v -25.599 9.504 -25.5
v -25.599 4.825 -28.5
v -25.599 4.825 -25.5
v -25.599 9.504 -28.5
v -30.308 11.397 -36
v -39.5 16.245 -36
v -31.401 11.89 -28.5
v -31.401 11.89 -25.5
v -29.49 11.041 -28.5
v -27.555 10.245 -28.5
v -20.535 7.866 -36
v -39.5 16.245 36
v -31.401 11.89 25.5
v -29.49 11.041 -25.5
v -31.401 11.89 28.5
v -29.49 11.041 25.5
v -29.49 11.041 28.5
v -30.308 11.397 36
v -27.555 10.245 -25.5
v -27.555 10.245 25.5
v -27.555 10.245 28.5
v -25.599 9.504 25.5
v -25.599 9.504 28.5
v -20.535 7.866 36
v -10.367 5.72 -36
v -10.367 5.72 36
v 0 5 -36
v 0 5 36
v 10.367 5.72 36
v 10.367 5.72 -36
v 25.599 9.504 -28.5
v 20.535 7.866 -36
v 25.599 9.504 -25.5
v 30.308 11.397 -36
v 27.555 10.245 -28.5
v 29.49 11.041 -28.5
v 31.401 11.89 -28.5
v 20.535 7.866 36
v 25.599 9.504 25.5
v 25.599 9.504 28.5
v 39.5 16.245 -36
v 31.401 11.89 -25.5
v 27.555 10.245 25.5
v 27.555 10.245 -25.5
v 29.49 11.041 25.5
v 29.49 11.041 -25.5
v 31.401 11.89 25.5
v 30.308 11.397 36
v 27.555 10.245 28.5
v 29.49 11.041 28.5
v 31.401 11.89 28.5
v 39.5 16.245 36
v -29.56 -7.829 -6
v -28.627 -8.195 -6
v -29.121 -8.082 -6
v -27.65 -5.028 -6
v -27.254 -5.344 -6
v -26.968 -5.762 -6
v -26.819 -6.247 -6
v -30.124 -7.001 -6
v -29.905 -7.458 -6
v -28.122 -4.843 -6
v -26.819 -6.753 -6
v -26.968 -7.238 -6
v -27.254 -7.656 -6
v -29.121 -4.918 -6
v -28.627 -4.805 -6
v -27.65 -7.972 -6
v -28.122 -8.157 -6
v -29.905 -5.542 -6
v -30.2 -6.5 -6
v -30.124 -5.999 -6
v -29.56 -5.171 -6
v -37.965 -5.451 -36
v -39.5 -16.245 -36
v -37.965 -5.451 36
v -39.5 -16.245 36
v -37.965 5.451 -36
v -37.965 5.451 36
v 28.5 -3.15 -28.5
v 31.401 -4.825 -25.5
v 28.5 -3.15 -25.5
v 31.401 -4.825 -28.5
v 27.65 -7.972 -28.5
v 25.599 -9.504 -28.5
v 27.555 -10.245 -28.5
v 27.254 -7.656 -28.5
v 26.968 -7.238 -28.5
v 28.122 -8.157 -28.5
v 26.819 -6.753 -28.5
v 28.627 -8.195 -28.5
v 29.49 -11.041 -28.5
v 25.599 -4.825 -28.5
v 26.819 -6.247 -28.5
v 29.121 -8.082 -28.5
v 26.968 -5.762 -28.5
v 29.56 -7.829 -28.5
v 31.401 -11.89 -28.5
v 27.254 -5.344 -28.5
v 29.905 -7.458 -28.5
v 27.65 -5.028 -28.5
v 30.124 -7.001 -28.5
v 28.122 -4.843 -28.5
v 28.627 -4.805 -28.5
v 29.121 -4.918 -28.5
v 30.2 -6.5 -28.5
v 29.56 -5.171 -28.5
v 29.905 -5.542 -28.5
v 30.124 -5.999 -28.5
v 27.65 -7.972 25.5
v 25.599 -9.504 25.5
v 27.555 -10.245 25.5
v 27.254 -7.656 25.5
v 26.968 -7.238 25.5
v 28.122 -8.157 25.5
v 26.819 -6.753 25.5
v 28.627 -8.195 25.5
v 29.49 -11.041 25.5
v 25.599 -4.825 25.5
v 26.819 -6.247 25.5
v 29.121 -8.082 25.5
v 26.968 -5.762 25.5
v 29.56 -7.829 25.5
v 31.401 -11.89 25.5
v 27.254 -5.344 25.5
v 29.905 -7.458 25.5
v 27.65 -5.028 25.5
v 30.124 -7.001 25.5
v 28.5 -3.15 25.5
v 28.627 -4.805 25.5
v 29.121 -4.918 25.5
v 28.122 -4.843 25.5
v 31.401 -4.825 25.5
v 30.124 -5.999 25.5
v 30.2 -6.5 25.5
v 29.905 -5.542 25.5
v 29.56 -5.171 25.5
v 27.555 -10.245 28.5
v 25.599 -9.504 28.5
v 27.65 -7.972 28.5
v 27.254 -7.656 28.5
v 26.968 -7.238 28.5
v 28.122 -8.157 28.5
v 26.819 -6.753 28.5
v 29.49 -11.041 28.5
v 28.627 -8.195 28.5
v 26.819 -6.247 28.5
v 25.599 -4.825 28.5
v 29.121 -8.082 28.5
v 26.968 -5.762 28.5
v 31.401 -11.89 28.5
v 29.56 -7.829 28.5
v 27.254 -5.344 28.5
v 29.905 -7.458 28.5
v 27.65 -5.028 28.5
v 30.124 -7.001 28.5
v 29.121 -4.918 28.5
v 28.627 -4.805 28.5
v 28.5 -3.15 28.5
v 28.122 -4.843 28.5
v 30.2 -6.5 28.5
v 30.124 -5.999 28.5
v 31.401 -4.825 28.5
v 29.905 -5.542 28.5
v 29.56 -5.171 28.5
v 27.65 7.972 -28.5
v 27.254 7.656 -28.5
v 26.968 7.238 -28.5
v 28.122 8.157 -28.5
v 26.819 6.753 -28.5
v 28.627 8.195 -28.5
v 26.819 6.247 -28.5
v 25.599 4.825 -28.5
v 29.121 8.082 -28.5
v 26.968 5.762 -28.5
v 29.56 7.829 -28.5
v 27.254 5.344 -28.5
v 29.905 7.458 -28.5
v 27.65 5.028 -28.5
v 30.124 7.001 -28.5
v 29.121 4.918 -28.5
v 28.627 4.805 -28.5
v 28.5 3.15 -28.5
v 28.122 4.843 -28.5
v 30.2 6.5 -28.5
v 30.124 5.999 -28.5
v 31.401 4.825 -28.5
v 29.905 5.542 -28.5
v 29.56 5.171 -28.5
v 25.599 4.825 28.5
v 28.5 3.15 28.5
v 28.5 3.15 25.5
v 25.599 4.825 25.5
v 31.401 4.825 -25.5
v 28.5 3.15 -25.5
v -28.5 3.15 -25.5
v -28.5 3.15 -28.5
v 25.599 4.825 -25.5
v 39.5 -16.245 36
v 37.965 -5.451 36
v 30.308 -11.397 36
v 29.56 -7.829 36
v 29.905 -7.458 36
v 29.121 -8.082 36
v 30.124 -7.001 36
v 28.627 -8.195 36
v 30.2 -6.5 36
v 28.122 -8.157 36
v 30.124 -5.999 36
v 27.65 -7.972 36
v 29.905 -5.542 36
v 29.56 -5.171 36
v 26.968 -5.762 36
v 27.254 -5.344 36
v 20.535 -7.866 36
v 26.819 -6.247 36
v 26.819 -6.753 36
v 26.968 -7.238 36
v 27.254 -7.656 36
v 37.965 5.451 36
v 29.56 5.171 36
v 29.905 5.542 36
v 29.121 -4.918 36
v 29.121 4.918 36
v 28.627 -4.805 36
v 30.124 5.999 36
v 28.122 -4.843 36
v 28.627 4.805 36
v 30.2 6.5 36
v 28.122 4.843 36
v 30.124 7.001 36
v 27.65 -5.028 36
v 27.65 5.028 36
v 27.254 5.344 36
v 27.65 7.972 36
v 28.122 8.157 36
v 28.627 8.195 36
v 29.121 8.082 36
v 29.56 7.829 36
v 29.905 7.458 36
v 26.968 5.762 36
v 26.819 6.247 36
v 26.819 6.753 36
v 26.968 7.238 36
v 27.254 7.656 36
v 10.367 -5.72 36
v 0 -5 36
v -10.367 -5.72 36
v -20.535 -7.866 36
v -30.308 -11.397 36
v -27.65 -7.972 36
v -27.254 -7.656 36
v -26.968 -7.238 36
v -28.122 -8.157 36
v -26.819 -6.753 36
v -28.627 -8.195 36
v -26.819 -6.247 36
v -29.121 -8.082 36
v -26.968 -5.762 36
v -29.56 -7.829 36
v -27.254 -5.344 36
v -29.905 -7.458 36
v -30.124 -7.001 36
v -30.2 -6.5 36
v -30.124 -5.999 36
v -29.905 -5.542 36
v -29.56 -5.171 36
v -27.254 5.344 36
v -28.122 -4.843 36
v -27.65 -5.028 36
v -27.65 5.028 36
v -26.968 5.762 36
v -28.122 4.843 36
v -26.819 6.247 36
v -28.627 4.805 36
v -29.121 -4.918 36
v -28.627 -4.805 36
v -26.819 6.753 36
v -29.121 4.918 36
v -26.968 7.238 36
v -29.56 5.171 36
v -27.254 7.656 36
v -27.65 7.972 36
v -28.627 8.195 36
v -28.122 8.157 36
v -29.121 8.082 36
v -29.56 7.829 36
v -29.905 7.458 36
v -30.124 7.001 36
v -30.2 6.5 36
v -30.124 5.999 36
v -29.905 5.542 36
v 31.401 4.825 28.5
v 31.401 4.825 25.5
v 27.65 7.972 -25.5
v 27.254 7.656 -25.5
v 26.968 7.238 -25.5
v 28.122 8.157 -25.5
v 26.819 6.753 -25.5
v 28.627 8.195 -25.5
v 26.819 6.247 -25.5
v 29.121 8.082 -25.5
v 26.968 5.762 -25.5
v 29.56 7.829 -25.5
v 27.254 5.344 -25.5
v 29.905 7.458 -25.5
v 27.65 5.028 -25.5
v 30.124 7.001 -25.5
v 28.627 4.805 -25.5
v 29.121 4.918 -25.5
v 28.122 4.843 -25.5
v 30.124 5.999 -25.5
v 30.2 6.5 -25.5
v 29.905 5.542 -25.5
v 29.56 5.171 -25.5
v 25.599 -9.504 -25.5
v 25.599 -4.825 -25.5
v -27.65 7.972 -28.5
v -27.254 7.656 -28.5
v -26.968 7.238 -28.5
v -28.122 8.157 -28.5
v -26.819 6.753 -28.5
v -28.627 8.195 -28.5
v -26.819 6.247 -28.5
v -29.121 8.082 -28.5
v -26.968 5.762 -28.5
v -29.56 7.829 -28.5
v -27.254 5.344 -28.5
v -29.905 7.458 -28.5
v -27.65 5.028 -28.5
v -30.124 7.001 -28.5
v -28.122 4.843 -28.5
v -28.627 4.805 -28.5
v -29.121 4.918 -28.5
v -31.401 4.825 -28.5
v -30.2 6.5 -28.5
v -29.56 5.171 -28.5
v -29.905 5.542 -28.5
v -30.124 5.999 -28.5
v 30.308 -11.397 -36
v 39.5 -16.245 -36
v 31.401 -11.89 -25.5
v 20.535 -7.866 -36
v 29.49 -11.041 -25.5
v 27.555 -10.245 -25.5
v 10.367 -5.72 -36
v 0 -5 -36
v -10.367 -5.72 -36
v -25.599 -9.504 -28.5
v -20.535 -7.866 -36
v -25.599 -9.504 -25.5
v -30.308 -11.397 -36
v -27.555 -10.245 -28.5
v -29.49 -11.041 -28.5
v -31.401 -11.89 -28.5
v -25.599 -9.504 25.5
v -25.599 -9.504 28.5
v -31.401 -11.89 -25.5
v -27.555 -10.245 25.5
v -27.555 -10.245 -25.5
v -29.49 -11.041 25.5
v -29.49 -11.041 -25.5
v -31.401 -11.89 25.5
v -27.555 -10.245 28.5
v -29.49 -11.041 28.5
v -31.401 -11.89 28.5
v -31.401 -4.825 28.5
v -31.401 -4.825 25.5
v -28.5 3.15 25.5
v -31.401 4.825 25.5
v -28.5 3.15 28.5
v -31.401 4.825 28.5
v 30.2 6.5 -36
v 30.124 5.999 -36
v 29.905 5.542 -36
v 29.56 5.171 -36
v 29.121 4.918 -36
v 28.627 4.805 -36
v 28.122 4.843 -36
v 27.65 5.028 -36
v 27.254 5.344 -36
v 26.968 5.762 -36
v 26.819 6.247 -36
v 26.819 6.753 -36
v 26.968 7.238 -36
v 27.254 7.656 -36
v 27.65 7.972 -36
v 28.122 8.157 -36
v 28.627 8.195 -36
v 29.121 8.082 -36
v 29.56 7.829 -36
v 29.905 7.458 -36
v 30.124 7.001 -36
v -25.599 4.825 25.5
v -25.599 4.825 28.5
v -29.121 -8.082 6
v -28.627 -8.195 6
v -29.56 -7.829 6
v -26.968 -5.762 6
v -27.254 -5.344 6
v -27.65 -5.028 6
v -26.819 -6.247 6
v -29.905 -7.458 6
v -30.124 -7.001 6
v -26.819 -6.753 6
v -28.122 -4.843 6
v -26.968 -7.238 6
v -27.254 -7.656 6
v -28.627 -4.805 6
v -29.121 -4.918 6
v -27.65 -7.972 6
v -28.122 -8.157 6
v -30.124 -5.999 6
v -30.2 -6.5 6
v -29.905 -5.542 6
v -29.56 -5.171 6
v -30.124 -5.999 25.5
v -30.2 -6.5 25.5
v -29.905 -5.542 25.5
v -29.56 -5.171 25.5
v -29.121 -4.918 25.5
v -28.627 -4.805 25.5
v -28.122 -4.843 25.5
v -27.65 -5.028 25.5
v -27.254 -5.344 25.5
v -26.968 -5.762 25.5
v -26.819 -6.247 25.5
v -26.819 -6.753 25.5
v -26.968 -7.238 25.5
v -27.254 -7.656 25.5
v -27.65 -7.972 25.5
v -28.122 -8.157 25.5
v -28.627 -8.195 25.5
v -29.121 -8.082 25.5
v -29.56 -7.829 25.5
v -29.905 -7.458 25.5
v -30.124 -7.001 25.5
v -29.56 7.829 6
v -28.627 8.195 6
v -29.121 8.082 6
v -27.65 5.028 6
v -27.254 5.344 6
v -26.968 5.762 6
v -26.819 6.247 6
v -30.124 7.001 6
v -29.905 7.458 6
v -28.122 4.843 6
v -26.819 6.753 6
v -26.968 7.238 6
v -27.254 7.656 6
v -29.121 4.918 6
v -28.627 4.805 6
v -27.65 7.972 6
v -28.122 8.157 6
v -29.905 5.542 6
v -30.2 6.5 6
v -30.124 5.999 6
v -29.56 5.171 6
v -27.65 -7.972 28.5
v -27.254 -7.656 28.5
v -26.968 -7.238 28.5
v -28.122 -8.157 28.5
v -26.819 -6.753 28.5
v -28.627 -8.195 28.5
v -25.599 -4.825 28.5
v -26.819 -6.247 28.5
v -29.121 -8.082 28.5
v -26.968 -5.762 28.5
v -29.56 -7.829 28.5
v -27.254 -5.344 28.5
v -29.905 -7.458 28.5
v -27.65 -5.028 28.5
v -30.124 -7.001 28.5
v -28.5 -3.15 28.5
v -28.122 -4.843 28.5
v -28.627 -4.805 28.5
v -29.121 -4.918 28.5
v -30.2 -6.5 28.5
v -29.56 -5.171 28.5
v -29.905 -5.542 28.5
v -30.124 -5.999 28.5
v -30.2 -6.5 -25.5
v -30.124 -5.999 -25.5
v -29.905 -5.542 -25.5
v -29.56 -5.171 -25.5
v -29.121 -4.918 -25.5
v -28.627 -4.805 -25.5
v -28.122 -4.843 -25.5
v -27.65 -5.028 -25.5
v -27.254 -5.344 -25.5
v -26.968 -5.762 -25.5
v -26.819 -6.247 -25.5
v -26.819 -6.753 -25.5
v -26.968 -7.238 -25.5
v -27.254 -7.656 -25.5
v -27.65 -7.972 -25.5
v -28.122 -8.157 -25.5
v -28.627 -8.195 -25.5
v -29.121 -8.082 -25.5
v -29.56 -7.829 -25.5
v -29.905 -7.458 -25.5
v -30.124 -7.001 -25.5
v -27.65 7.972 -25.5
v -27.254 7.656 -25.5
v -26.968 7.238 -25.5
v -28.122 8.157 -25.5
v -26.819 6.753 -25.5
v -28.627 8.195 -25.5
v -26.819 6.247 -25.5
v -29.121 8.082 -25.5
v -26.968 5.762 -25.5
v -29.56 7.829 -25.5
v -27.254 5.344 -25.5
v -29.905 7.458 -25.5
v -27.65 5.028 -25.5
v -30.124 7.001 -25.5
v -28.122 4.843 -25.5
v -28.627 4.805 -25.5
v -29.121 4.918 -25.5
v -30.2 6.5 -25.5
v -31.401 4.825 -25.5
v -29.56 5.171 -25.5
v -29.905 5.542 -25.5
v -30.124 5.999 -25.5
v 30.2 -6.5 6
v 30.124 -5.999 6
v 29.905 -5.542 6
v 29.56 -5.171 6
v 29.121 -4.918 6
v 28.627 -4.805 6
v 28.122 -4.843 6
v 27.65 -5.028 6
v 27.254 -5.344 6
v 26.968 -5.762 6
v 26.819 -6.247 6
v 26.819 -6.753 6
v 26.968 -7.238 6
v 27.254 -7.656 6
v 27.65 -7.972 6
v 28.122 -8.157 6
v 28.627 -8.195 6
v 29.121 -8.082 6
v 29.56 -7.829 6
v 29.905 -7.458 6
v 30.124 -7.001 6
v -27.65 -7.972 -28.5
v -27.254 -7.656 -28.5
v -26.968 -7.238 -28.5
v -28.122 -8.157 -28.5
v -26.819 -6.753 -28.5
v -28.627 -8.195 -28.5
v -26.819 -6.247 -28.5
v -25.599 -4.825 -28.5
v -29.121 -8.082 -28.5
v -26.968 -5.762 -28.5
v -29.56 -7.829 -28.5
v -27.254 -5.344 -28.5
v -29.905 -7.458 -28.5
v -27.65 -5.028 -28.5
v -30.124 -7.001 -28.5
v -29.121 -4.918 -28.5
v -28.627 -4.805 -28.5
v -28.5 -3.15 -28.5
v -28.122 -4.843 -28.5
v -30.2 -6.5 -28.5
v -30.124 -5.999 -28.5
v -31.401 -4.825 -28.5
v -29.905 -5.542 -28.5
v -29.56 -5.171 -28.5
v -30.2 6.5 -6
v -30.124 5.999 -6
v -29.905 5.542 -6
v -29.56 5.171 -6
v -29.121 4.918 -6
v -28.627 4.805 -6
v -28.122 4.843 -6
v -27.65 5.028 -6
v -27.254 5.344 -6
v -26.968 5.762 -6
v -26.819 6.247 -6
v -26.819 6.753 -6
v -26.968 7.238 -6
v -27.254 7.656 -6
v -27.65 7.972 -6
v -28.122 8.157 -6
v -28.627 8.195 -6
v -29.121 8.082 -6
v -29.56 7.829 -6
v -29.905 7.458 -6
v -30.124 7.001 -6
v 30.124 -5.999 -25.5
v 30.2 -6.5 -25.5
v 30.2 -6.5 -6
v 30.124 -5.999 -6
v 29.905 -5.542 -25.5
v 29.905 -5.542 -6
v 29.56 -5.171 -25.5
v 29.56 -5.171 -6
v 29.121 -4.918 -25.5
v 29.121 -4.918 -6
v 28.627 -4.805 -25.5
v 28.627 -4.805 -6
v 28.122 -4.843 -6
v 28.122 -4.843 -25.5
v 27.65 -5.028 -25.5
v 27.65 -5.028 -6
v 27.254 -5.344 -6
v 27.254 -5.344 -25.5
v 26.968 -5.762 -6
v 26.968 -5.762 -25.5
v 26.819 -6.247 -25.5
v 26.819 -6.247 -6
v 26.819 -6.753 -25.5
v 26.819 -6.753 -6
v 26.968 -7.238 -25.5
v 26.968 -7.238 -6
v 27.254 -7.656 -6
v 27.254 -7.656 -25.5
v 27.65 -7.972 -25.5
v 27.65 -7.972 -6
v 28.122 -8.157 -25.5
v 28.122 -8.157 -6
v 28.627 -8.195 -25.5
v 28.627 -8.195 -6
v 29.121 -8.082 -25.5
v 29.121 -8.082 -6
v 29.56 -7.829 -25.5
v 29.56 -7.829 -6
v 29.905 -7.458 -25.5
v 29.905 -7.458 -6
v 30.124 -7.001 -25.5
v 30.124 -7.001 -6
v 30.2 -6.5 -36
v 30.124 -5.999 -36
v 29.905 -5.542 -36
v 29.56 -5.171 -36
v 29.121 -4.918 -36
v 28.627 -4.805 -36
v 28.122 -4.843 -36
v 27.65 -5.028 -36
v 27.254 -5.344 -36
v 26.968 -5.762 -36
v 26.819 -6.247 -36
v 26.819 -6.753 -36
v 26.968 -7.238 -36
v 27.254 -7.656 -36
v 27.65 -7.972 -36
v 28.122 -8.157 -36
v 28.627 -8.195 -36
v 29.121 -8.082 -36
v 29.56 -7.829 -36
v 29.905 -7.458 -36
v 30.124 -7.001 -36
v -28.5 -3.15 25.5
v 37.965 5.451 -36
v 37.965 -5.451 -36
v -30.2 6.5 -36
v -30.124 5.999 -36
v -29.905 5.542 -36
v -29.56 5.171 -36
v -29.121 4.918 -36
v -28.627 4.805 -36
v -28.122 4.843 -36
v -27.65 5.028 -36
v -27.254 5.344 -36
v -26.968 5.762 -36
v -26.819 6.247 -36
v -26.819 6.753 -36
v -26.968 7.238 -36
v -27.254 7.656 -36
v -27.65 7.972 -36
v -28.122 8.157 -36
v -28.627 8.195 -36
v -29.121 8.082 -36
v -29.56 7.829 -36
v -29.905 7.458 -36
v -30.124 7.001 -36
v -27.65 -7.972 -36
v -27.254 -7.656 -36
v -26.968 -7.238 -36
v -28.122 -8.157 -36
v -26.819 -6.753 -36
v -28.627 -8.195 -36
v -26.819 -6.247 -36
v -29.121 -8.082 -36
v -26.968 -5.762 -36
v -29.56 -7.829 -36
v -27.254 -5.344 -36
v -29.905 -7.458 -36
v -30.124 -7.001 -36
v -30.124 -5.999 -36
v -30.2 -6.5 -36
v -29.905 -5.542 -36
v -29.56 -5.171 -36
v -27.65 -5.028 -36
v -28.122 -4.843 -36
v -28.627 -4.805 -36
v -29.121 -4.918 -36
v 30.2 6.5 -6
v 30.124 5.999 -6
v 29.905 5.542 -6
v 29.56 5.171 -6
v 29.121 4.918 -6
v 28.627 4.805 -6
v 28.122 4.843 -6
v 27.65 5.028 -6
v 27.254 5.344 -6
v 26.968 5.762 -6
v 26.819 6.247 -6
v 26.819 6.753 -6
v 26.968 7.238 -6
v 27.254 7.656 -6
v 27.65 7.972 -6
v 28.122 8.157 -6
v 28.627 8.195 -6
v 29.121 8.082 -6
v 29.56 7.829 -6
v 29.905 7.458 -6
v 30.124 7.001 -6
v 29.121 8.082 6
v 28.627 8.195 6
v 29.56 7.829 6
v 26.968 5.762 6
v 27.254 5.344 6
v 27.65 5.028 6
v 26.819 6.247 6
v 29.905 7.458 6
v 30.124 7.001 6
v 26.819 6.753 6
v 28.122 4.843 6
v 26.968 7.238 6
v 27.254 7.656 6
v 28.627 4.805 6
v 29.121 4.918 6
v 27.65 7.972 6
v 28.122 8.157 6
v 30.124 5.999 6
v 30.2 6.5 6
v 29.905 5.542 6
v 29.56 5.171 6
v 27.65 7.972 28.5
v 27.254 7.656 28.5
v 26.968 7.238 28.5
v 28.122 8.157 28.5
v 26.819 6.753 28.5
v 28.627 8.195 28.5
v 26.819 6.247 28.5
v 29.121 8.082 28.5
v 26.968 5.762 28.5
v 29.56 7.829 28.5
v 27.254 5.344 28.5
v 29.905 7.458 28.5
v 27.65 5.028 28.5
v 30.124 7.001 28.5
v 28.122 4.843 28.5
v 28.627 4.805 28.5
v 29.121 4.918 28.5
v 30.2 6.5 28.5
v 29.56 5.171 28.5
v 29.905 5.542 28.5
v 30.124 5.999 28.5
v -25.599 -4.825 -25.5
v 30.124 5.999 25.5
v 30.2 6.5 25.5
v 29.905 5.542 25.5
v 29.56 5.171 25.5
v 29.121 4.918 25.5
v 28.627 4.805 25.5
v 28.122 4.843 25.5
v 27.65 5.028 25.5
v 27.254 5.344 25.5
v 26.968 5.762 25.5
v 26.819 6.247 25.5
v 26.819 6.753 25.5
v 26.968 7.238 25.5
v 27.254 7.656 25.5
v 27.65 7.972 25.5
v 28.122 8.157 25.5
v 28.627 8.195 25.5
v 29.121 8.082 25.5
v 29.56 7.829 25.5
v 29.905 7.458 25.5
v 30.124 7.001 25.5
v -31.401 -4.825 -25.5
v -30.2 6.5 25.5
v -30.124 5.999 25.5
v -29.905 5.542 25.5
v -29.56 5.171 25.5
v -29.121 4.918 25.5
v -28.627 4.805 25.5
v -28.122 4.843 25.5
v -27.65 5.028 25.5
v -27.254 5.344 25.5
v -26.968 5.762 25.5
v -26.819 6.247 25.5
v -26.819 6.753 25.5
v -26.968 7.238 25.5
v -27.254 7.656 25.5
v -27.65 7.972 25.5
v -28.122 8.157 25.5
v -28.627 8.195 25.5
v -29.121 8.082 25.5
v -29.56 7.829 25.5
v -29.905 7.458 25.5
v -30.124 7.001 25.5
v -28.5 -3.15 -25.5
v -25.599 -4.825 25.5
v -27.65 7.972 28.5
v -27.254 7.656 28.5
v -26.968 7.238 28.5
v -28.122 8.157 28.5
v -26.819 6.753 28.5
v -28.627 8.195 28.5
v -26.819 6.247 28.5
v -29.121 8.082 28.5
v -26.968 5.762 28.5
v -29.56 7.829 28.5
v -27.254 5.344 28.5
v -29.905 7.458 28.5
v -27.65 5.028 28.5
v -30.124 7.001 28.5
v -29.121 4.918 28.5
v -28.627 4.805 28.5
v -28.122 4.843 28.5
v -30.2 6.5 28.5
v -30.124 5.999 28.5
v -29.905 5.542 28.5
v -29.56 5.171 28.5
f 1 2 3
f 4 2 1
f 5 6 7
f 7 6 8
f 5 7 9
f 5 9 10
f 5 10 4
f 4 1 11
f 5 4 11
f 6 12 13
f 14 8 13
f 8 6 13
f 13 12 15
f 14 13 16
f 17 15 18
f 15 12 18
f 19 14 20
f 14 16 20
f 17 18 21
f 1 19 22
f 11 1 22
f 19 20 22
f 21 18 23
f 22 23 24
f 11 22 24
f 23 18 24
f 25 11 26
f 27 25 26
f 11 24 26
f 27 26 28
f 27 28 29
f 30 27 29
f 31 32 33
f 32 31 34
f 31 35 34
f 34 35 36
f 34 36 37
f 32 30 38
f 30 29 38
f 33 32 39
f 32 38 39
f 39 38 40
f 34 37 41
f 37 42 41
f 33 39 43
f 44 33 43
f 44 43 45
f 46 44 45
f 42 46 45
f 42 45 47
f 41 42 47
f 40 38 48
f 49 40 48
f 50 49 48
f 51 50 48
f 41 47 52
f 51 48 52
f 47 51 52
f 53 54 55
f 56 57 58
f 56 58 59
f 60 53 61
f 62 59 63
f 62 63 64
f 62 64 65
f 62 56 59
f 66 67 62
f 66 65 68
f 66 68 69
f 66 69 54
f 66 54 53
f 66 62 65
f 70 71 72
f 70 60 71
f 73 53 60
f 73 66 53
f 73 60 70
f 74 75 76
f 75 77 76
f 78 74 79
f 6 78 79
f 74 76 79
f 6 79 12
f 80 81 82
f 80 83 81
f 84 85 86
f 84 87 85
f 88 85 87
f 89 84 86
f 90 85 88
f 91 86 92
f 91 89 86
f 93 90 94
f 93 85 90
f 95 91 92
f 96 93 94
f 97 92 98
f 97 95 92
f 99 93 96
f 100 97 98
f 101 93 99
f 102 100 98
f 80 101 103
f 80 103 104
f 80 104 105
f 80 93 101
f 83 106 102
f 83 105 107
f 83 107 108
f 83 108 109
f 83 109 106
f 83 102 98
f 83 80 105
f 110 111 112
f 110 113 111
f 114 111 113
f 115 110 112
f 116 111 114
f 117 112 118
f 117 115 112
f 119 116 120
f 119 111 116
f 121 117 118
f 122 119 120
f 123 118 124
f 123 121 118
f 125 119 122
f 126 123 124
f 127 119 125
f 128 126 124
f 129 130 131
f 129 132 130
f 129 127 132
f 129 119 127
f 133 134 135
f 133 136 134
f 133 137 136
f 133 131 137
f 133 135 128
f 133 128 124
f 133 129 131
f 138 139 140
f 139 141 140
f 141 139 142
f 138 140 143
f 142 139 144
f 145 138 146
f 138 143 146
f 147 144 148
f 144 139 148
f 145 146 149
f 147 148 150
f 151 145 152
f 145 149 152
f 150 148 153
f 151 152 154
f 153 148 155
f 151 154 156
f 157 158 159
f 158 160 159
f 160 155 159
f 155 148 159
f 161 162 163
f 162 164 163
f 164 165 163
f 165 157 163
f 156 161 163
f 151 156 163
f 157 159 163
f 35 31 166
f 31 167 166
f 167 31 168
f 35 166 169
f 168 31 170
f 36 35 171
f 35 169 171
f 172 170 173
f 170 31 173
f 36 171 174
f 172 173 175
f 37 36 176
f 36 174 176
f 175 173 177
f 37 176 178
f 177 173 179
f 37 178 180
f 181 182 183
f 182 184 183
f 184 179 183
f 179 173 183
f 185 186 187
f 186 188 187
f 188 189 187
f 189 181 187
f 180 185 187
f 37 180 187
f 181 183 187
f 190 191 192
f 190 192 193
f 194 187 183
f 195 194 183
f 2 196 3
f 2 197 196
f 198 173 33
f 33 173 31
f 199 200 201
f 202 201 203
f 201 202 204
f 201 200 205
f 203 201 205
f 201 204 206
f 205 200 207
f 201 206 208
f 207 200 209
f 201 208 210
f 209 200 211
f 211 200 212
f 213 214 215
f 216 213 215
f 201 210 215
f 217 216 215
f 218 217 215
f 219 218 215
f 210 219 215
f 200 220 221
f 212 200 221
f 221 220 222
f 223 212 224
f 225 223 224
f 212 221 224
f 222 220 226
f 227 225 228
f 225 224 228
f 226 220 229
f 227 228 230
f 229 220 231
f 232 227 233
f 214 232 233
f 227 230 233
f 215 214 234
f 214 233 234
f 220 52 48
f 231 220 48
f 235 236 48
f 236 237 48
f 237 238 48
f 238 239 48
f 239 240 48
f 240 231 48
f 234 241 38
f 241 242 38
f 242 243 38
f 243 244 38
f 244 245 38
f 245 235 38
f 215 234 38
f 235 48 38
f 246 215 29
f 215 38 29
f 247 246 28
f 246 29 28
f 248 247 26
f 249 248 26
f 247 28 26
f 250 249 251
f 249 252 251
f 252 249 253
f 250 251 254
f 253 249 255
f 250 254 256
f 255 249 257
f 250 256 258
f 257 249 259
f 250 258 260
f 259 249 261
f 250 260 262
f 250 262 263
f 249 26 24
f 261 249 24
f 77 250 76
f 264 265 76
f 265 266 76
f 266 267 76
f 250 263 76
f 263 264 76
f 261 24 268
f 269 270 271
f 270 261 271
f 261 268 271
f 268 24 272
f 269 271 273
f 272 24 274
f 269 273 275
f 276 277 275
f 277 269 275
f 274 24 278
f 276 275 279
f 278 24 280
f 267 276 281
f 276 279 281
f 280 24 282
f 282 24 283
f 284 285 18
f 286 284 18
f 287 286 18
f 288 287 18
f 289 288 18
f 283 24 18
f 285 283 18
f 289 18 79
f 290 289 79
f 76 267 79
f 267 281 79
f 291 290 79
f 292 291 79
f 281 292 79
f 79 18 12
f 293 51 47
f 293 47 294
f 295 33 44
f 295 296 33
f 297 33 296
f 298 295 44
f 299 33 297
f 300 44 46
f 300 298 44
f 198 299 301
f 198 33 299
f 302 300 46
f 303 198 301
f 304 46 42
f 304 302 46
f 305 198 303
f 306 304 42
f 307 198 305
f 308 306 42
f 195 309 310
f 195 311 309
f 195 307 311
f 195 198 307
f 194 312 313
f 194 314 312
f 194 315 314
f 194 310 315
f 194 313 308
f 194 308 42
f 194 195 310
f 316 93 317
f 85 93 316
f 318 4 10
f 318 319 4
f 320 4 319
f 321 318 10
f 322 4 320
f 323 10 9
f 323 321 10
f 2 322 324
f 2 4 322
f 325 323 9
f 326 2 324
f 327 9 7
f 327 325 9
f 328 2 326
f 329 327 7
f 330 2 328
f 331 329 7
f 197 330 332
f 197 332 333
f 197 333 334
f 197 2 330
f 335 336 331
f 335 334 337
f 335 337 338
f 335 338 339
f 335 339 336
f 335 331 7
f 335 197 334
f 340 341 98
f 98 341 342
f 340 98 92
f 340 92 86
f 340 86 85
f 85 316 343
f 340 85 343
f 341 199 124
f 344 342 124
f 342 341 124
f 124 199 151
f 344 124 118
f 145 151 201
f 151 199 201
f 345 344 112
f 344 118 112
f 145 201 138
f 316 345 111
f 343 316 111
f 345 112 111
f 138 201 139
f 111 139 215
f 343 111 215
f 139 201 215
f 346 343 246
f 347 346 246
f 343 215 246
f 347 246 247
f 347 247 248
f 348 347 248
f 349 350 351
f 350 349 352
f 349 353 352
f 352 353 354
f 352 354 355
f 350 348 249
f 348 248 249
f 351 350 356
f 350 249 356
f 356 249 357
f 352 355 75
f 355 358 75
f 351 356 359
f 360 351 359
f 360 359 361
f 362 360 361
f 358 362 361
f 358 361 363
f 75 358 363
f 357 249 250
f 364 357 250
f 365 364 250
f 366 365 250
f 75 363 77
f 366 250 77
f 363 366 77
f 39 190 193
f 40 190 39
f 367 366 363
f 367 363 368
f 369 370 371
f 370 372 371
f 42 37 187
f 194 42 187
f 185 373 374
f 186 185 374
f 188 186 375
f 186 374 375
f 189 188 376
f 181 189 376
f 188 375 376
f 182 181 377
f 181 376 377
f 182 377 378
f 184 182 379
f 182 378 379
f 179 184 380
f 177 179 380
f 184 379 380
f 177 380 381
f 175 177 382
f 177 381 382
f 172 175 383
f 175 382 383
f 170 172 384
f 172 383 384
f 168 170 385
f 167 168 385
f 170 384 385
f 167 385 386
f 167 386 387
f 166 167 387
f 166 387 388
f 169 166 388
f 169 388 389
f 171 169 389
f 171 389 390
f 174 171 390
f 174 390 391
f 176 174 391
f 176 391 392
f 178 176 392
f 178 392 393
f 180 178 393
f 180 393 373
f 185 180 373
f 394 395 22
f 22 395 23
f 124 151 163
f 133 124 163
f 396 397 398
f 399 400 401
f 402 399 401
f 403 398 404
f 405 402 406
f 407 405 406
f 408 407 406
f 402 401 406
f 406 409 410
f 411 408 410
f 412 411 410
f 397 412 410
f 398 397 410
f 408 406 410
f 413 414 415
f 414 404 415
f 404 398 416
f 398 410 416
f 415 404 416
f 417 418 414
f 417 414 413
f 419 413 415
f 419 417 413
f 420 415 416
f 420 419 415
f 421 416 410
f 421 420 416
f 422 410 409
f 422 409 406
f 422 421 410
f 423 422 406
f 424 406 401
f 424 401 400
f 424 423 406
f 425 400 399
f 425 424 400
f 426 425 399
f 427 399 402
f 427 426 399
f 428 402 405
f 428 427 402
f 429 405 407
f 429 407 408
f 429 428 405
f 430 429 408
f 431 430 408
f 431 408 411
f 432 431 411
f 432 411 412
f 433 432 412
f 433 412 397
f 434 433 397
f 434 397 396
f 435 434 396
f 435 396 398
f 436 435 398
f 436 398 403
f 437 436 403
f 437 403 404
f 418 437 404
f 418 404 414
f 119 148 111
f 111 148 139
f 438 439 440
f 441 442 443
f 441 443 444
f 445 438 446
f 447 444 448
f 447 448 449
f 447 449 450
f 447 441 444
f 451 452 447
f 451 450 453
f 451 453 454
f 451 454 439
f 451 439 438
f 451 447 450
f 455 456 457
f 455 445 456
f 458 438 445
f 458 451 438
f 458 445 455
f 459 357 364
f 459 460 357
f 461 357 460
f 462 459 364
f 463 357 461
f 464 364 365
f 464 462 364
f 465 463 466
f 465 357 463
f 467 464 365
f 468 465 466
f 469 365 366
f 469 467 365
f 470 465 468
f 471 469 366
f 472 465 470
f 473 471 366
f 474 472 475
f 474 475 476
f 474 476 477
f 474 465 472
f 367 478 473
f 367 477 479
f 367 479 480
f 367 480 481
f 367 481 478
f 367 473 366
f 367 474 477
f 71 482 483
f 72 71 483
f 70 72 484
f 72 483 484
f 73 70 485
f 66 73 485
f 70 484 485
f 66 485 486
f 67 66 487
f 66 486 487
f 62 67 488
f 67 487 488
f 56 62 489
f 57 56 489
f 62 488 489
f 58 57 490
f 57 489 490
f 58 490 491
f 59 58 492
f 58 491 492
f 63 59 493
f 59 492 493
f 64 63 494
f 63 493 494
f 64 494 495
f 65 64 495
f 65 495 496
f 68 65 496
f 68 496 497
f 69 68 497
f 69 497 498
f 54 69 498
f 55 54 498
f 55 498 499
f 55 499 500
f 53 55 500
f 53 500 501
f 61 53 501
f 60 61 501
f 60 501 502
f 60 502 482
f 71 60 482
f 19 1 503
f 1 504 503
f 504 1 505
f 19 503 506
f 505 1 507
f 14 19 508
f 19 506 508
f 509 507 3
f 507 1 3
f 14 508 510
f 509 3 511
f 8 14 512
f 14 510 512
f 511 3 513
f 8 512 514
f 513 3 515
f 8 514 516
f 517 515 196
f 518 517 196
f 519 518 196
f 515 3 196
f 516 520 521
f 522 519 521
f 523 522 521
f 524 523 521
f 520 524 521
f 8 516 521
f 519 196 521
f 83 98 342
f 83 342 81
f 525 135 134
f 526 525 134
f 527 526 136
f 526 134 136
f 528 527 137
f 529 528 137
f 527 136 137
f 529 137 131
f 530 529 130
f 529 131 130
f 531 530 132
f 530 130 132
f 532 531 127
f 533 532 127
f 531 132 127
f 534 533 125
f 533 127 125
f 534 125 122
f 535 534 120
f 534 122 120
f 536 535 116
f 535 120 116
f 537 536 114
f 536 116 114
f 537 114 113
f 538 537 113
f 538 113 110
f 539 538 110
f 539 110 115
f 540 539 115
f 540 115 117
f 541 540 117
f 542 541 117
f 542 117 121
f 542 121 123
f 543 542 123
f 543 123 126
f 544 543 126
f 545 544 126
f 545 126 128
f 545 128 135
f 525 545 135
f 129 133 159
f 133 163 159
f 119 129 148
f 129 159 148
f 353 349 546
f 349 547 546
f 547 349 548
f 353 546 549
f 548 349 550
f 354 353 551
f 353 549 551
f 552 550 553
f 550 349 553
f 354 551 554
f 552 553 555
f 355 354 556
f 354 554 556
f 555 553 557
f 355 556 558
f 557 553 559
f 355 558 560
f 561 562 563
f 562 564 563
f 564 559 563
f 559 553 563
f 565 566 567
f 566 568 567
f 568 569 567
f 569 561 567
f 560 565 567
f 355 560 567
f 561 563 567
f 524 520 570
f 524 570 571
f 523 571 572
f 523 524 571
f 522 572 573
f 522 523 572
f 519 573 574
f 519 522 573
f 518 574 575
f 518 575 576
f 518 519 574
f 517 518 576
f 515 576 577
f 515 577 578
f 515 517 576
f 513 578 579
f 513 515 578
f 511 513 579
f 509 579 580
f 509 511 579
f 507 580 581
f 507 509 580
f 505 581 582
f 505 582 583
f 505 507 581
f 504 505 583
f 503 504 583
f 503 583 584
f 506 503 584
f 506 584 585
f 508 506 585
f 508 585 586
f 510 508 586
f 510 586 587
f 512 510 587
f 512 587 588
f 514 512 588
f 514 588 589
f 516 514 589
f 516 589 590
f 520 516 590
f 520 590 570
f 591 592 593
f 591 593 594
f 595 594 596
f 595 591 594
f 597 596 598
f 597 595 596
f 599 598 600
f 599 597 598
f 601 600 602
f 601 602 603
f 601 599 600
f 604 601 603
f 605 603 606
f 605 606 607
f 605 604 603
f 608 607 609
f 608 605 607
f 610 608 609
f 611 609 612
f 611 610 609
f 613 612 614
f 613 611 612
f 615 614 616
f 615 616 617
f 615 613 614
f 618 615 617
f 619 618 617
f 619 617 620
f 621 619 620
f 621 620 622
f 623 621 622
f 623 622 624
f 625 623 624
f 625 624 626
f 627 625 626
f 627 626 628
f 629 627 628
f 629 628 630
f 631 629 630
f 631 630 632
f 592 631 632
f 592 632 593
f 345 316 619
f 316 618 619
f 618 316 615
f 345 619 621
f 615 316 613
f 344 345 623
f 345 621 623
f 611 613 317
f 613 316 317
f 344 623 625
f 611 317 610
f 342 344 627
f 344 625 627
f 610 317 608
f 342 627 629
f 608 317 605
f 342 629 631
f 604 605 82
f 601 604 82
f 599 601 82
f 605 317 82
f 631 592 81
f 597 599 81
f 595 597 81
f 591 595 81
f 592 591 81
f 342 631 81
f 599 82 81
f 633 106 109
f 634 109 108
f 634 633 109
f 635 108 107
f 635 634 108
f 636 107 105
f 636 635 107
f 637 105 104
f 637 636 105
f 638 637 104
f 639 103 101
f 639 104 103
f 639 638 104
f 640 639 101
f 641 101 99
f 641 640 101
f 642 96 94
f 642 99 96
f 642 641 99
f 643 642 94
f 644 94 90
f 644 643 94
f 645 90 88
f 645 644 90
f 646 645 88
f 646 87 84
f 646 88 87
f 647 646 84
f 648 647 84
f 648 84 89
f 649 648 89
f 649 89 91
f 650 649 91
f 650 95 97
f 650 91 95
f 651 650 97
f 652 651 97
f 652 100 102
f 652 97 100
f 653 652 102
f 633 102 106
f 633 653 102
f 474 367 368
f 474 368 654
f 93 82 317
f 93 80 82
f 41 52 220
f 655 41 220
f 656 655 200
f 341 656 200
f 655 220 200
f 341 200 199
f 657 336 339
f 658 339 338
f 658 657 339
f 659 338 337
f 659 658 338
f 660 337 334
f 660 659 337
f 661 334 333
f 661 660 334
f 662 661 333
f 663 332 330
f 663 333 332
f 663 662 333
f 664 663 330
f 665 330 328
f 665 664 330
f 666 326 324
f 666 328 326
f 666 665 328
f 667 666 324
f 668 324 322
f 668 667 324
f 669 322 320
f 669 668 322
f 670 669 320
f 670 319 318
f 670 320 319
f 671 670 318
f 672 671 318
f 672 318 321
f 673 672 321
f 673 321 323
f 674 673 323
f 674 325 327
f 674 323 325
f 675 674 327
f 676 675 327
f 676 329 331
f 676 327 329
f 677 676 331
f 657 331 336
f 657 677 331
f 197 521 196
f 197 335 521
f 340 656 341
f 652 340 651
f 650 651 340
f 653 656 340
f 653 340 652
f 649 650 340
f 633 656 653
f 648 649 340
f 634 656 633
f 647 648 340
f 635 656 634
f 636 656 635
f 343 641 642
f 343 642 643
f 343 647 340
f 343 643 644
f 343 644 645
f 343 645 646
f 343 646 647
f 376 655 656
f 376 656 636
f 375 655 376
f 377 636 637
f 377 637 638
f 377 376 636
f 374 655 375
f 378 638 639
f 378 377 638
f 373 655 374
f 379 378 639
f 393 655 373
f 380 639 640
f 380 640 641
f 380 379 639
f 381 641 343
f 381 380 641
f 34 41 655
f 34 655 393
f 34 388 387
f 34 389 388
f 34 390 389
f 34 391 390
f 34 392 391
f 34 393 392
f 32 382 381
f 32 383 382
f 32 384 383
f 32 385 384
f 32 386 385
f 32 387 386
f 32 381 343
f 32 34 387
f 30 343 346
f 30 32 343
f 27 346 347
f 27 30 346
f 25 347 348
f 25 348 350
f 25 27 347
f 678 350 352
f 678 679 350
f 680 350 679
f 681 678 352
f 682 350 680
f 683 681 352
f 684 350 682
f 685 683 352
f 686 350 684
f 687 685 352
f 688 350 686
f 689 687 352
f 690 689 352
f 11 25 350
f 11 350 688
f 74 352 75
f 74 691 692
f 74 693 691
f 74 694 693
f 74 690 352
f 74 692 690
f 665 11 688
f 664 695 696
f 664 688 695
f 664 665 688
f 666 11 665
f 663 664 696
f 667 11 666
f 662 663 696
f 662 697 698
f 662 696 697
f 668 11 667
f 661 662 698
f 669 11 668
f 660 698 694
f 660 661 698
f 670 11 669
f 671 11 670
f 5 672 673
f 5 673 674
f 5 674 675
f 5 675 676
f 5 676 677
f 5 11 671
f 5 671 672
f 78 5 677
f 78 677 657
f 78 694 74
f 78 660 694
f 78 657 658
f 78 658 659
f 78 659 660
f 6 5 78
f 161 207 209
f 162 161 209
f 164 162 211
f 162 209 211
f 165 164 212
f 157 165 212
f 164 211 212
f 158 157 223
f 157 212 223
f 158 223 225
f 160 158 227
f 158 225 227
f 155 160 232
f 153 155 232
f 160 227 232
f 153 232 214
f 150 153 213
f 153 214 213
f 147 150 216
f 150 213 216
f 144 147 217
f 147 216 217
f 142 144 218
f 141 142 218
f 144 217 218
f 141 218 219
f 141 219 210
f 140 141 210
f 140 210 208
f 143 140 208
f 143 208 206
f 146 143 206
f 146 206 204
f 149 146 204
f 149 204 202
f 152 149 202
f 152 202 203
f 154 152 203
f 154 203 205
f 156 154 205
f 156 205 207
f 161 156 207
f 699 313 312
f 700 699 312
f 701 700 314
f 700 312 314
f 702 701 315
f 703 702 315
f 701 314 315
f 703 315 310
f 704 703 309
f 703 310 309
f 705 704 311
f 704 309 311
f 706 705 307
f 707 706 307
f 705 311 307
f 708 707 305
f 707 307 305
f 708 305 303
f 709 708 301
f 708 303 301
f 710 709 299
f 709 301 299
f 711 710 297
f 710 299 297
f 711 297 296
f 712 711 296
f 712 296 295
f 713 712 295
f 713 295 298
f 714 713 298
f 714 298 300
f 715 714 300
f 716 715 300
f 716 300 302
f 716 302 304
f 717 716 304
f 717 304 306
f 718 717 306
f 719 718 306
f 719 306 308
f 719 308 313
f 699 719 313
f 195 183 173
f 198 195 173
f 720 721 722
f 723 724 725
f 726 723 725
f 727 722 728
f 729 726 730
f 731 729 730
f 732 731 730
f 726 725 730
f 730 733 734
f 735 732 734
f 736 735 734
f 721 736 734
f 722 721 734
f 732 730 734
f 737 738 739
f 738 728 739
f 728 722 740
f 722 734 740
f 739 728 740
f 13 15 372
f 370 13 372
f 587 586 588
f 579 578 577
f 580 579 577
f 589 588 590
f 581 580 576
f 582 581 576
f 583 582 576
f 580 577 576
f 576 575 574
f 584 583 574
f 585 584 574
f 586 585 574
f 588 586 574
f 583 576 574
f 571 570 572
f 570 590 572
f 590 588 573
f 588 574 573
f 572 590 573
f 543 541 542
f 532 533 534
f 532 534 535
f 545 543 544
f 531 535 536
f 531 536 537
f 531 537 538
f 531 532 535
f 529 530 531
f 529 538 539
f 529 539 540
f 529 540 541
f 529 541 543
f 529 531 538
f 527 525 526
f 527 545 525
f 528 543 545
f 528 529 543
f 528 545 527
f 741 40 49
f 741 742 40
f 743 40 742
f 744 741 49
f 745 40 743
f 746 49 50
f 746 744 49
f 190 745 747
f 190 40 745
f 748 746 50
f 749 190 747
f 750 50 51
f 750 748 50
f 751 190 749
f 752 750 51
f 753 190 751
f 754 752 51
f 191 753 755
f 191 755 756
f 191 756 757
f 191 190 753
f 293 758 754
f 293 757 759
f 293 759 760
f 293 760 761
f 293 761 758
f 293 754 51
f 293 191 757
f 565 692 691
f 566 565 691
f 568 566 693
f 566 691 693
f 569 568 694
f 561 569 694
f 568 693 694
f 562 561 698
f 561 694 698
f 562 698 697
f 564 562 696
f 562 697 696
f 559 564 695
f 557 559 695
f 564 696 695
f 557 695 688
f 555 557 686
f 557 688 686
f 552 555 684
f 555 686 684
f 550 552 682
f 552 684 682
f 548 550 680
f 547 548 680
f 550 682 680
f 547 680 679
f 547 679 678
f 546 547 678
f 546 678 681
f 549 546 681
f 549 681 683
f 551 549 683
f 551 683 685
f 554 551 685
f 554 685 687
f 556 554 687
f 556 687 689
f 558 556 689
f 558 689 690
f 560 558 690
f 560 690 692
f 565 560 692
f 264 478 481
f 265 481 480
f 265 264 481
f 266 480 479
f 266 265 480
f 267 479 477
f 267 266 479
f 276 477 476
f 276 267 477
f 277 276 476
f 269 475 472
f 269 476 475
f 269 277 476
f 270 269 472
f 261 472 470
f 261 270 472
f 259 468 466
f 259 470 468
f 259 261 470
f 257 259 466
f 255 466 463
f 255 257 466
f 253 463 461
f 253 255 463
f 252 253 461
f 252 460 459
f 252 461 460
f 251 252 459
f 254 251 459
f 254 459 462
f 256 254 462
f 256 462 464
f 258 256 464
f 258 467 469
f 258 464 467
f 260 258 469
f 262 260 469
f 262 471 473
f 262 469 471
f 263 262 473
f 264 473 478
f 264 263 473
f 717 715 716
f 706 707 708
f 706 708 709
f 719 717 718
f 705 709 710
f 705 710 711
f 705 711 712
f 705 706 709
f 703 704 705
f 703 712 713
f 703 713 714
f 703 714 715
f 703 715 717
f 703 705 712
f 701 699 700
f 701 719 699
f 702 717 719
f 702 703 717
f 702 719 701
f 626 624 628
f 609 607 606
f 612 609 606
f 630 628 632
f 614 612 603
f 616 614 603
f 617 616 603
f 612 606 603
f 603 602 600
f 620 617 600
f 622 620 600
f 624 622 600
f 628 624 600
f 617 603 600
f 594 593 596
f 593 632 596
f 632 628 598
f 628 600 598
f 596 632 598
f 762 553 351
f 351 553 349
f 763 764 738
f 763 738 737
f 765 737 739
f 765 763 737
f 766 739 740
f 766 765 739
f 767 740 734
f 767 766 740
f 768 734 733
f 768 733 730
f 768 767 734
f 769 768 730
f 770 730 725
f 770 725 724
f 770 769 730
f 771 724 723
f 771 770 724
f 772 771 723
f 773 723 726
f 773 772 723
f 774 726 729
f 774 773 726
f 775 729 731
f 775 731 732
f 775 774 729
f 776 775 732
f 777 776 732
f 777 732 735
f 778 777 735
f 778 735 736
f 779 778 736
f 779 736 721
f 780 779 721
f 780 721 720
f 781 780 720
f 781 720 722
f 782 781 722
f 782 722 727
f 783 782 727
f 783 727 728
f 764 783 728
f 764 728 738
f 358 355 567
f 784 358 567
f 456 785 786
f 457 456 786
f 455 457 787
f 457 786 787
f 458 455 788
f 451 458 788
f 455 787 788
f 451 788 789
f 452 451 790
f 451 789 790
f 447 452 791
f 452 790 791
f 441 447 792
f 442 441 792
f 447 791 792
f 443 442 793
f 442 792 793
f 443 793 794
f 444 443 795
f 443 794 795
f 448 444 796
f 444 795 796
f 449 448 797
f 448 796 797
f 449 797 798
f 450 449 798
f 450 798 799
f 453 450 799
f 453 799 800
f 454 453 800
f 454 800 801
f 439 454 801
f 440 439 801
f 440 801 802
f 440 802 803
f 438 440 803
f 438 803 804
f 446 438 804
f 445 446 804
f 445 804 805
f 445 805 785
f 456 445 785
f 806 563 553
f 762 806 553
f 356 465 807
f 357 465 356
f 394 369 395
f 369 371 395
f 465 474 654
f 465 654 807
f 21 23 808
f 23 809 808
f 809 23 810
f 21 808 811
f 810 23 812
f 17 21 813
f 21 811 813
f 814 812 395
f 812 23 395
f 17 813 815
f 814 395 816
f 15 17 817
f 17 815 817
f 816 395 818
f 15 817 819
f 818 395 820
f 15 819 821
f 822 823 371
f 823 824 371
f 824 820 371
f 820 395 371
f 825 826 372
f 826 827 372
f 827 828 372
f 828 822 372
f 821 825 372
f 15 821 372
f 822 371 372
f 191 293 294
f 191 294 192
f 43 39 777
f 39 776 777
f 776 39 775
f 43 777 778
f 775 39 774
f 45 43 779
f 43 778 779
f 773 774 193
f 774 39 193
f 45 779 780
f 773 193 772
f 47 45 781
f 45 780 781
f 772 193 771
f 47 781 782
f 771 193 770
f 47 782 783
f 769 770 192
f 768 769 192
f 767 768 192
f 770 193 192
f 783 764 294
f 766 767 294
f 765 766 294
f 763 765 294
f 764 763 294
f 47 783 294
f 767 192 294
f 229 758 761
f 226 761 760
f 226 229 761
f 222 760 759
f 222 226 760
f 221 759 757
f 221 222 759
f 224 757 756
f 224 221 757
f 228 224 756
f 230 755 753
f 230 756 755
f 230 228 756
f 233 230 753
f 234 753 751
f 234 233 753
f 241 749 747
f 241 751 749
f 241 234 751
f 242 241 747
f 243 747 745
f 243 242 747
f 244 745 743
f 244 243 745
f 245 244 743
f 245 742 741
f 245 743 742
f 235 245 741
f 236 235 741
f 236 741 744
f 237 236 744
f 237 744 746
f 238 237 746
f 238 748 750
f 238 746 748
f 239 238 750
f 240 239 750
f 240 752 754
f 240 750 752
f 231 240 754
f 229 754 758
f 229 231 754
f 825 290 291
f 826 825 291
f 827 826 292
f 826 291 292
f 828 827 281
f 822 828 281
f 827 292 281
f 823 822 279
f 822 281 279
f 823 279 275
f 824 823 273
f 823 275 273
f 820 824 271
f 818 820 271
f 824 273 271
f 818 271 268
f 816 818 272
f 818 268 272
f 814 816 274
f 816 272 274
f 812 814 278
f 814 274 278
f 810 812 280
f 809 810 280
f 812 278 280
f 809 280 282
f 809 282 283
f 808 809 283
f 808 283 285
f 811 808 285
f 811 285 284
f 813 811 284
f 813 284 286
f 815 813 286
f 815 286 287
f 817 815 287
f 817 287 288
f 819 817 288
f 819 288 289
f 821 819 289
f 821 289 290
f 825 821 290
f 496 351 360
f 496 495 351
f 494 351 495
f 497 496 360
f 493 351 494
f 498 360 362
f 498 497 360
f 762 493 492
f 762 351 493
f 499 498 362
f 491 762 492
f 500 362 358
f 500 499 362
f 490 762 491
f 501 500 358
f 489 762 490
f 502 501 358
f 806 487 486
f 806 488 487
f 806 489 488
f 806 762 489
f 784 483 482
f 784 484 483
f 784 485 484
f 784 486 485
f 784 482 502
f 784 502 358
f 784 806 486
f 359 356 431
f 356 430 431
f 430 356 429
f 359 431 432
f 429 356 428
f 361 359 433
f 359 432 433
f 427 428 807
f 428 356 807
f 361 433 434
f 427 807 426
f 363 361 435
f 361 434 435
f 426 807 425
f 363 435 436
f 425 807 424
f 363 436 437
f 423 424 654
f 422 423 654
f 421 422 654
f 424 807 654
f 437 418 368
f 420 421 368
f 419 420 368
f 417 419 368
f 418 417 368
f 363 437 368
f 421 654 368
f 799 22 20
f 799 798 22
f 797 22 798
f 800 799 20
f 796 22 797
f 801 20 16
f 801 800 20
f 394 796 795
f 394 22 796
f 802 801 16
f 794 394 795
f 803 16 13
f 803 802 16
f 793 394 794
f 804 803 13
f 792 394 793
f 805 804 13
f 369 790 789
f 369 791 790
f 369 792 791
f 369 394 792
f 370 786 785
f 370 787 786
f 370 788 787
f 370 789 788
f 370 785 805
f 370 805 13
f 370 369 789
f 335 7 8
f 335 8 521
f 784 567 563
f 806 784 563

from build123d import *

# Parameters (mm, degrees)
PAD_DEPTH                                = 36
SKETCH001_R                              = 1.7
POCKET_DEPTH                             = 30
POCKET001_DEPTH                          = 1.5
POCKET001_MIRRORED_2_DEPTH               = 1.5
SKETCH001_MIRRORED_2_R                   = 1.7
POCKET_MIRRORED_2_DEPTH                  = 30
POCKET001_MIRRORED001_2_DEPTH            = 1.5
SKETCH001_MIRRORED001_2_R                = 1.7
POCKET_MIRRORED001_2_DEPTH               = 30
POCKET001_MIRRORED_2_MIRRORED001_2_DEPTH = 1.5
SKETCH001_MIRRORED_2_MIRRORED001_2_R     = 1.7
POCKET_MIRRORED_2_MIRRORED001_2_DEPTH    = 30


with BuildPart() as part:
    # Sketch → Pad (new body, symmetric)
    with BuildSketch(Plane.XY):
        with BuildLine():
            ThreePointArc((39.5, -16.244608), (0, -5), (-39.5, -16.244608))
            ThreePointArc((-39.5, -16.244608), (-37.772173, 0), (-39.5, 16.244608))
            ThreePointArc((-39.5, 16.244608), (0, 5), (39.5, 16.244608))
            ThreePointArc((39.5, 16.244608), (37.772173, 0), (39.5, -16.244608))
        make_face()
    extrude(amount=PAD_DEPTH, both=True)

    # Sketch001 (on Face6 of Pad) → Pocket (cut)
    with BuildSketch(Plane.XY.offset(36)):
        with Locations((28.5, -6.5)):
            Circle(SKETCH001_R)
    pocket = extrude(amount=-POCKET_DEPTH, mode=Mode.SUBTRACT)

    # Sketch002 (on DatumPlane) → Pocket001 (cut, symmetric)
    with BuildSketch(Plane.XY.offset(27)):
        Polygon((28.5, -3.15), (25.598815, -4.825), (25.598815, -14.825), (31.401185, -14.825), (31.401185, -4.825), align=None)
    pocket001 = extrude(amount=POCKET001_DEPTH, both=True, mode=Mode.SUBTRACT)

    # Sketch002 Mirrored 2 → Pocket001 Mirrored 2 (cut, symmetric)
    with BuildSketch(Plane(origin=(0, 0, 27), x_dir=(1, 0, 0), z_dir=(0, 0, -1))):
        Polygon((28.5, -3.15), (25.598815, -4.825), (25.598815, -14.825), (31.401185, -14.825), (31.401185, -4.825), align=None)
    pocket001_mirrored_2 = extrude(amount=-POCKET001_MIRRORED_2_DEPTH, both=True, mode=Mode.SUBTRACT)

    # Sketch001 Mirrored 2 → Pocket Mirrored 2 (cut)
    with BuildSketch(Plane(origin=(0, 0, 36), x_dir=(1, 0, 0), z_dir=(0, 0, -1))):
        with Locations((28.5, -6.5)):
            Circle(SKETCH001_MIRRORED_2_R)
    pocket_mirrored_2 = extrude(amount=POCKET_MIRRORED_2_DEPTH, mode=Mode.SUBTRACT)

    # Sketch002 Mirrored001 2 → Pocket001 Mirrored001 2 (cut, symmetric)
    with BuildSketch(Plane(origin=(0, 0, 27), x_dir=(-1, 0, 0), z_dir=(0, 0, -1))):
        Polygon((28.5, -3.15), (25.598815, -4.825), (25.598815, -14.825), (31.401185, -14.825), (31.401185, -4.825), align=None)
    pocket001_mirrored001_2 = extrude(amount=-POCKET001_MIRRORED001_2_DEPTH, both=True, mode=Mode.SUBTRACT)

    # Sketch001 Mirrored001 2 → Pocket Mirrored001 2 (cut)
    with BuildSketch(Plane(origin=(0, 0, 36), x_dir=(-1, 0, 0), z_dir=(0, 0, -1))):
        with Locations((28.5, -6.5)):
            Circle(SKETCH001_MIRRORED001_2_R)
    pocket_mirrored001_2 = extrude(amount=POCKET_MIRRORED001_2_DEPTH, mode=Mode.SUBTRACT)

    # Sketch002 Mirrored 2 Mirrored001 2 → Pocket001 Mirrored 2 Mirrored001 2 (cut, symmetric)
    with BuildSketch(Plane(origin=(0, 0, 27), x_dir=(-1, 0, 0), z_dir=(0, 0, 1))):
        Polygon((28.5, -3.15), (25.598815, -4.825), (25.598815, -14.825), (31.401185, -14.825), (31.401185, -4.825), align=None)
    pocket001_mirrored_2_mirrored001_2 = extrude(amount=POCKET001_MIRRORED_2_MIRRORED001_2_DEPTH, both=True, mode=Mode.SUBTRACT)

    # Sketch001 Mirrored 2 Mirrored001 2 → Pocket Mirrored 2 Mirrored001 2 (cut)
    with BuildSketch(Plane(origin=(0, 0, 36), x_dir=(-1, 0, 0), z_dir=(0, 0, 1))):
        with Locations((28.5, -6.5)):
            Circle(SKETCH001_MIRRORED_2_MIRRORED001_2_R)
    pocket_mirrored_2_mirrored001_2 = extrude(amount=-POCKET_MIRRORED_2_MIRRORED001_2_DEPTH, mode=Mode.SUBTRACT)

    # Mirrored002: Pocket001, Pocket, Pocket001 Mirrored 2, Pocket Mirrored 2, Pocket001 Mirrored001 2, Pocket Mirrored001 2, Pocket001 Mirrored 2 Mirrored001 2, Pocket Mirrored 2 Mirrored001 2 across XY
    add(pocket001.mirror(Plane.XY), mode=Mode.SUBTRACT)
    add(pocket.mirror(Plane.XY), mode=Mode.SUBTRACT)
    add(pocket001_mirrored_2.mirror(Plane.XY), mode=Mode.SUBTRACT)
    add(pocket_mirrored_2.mirror(Plane.XY), mode=Mode.SUBTRACT)
    add(pocket001_mirrored001_2.mirror(Plane.XY), mode=Mode.SUBTRACT)
    add(pocket_mirrored001_2.mirror(Plane.XY), mode=Mode.SUBTRACT)
    add(pocket001_mirrored_2_mirrored001_2.mirror(Plane.XY), mode=Mode.SUBTRACT)
    add(pocket_mirrored_2_mirrored001_2.mirror(Plane.XY), mode=Mode.SUBTRACT)


solid = part.part
